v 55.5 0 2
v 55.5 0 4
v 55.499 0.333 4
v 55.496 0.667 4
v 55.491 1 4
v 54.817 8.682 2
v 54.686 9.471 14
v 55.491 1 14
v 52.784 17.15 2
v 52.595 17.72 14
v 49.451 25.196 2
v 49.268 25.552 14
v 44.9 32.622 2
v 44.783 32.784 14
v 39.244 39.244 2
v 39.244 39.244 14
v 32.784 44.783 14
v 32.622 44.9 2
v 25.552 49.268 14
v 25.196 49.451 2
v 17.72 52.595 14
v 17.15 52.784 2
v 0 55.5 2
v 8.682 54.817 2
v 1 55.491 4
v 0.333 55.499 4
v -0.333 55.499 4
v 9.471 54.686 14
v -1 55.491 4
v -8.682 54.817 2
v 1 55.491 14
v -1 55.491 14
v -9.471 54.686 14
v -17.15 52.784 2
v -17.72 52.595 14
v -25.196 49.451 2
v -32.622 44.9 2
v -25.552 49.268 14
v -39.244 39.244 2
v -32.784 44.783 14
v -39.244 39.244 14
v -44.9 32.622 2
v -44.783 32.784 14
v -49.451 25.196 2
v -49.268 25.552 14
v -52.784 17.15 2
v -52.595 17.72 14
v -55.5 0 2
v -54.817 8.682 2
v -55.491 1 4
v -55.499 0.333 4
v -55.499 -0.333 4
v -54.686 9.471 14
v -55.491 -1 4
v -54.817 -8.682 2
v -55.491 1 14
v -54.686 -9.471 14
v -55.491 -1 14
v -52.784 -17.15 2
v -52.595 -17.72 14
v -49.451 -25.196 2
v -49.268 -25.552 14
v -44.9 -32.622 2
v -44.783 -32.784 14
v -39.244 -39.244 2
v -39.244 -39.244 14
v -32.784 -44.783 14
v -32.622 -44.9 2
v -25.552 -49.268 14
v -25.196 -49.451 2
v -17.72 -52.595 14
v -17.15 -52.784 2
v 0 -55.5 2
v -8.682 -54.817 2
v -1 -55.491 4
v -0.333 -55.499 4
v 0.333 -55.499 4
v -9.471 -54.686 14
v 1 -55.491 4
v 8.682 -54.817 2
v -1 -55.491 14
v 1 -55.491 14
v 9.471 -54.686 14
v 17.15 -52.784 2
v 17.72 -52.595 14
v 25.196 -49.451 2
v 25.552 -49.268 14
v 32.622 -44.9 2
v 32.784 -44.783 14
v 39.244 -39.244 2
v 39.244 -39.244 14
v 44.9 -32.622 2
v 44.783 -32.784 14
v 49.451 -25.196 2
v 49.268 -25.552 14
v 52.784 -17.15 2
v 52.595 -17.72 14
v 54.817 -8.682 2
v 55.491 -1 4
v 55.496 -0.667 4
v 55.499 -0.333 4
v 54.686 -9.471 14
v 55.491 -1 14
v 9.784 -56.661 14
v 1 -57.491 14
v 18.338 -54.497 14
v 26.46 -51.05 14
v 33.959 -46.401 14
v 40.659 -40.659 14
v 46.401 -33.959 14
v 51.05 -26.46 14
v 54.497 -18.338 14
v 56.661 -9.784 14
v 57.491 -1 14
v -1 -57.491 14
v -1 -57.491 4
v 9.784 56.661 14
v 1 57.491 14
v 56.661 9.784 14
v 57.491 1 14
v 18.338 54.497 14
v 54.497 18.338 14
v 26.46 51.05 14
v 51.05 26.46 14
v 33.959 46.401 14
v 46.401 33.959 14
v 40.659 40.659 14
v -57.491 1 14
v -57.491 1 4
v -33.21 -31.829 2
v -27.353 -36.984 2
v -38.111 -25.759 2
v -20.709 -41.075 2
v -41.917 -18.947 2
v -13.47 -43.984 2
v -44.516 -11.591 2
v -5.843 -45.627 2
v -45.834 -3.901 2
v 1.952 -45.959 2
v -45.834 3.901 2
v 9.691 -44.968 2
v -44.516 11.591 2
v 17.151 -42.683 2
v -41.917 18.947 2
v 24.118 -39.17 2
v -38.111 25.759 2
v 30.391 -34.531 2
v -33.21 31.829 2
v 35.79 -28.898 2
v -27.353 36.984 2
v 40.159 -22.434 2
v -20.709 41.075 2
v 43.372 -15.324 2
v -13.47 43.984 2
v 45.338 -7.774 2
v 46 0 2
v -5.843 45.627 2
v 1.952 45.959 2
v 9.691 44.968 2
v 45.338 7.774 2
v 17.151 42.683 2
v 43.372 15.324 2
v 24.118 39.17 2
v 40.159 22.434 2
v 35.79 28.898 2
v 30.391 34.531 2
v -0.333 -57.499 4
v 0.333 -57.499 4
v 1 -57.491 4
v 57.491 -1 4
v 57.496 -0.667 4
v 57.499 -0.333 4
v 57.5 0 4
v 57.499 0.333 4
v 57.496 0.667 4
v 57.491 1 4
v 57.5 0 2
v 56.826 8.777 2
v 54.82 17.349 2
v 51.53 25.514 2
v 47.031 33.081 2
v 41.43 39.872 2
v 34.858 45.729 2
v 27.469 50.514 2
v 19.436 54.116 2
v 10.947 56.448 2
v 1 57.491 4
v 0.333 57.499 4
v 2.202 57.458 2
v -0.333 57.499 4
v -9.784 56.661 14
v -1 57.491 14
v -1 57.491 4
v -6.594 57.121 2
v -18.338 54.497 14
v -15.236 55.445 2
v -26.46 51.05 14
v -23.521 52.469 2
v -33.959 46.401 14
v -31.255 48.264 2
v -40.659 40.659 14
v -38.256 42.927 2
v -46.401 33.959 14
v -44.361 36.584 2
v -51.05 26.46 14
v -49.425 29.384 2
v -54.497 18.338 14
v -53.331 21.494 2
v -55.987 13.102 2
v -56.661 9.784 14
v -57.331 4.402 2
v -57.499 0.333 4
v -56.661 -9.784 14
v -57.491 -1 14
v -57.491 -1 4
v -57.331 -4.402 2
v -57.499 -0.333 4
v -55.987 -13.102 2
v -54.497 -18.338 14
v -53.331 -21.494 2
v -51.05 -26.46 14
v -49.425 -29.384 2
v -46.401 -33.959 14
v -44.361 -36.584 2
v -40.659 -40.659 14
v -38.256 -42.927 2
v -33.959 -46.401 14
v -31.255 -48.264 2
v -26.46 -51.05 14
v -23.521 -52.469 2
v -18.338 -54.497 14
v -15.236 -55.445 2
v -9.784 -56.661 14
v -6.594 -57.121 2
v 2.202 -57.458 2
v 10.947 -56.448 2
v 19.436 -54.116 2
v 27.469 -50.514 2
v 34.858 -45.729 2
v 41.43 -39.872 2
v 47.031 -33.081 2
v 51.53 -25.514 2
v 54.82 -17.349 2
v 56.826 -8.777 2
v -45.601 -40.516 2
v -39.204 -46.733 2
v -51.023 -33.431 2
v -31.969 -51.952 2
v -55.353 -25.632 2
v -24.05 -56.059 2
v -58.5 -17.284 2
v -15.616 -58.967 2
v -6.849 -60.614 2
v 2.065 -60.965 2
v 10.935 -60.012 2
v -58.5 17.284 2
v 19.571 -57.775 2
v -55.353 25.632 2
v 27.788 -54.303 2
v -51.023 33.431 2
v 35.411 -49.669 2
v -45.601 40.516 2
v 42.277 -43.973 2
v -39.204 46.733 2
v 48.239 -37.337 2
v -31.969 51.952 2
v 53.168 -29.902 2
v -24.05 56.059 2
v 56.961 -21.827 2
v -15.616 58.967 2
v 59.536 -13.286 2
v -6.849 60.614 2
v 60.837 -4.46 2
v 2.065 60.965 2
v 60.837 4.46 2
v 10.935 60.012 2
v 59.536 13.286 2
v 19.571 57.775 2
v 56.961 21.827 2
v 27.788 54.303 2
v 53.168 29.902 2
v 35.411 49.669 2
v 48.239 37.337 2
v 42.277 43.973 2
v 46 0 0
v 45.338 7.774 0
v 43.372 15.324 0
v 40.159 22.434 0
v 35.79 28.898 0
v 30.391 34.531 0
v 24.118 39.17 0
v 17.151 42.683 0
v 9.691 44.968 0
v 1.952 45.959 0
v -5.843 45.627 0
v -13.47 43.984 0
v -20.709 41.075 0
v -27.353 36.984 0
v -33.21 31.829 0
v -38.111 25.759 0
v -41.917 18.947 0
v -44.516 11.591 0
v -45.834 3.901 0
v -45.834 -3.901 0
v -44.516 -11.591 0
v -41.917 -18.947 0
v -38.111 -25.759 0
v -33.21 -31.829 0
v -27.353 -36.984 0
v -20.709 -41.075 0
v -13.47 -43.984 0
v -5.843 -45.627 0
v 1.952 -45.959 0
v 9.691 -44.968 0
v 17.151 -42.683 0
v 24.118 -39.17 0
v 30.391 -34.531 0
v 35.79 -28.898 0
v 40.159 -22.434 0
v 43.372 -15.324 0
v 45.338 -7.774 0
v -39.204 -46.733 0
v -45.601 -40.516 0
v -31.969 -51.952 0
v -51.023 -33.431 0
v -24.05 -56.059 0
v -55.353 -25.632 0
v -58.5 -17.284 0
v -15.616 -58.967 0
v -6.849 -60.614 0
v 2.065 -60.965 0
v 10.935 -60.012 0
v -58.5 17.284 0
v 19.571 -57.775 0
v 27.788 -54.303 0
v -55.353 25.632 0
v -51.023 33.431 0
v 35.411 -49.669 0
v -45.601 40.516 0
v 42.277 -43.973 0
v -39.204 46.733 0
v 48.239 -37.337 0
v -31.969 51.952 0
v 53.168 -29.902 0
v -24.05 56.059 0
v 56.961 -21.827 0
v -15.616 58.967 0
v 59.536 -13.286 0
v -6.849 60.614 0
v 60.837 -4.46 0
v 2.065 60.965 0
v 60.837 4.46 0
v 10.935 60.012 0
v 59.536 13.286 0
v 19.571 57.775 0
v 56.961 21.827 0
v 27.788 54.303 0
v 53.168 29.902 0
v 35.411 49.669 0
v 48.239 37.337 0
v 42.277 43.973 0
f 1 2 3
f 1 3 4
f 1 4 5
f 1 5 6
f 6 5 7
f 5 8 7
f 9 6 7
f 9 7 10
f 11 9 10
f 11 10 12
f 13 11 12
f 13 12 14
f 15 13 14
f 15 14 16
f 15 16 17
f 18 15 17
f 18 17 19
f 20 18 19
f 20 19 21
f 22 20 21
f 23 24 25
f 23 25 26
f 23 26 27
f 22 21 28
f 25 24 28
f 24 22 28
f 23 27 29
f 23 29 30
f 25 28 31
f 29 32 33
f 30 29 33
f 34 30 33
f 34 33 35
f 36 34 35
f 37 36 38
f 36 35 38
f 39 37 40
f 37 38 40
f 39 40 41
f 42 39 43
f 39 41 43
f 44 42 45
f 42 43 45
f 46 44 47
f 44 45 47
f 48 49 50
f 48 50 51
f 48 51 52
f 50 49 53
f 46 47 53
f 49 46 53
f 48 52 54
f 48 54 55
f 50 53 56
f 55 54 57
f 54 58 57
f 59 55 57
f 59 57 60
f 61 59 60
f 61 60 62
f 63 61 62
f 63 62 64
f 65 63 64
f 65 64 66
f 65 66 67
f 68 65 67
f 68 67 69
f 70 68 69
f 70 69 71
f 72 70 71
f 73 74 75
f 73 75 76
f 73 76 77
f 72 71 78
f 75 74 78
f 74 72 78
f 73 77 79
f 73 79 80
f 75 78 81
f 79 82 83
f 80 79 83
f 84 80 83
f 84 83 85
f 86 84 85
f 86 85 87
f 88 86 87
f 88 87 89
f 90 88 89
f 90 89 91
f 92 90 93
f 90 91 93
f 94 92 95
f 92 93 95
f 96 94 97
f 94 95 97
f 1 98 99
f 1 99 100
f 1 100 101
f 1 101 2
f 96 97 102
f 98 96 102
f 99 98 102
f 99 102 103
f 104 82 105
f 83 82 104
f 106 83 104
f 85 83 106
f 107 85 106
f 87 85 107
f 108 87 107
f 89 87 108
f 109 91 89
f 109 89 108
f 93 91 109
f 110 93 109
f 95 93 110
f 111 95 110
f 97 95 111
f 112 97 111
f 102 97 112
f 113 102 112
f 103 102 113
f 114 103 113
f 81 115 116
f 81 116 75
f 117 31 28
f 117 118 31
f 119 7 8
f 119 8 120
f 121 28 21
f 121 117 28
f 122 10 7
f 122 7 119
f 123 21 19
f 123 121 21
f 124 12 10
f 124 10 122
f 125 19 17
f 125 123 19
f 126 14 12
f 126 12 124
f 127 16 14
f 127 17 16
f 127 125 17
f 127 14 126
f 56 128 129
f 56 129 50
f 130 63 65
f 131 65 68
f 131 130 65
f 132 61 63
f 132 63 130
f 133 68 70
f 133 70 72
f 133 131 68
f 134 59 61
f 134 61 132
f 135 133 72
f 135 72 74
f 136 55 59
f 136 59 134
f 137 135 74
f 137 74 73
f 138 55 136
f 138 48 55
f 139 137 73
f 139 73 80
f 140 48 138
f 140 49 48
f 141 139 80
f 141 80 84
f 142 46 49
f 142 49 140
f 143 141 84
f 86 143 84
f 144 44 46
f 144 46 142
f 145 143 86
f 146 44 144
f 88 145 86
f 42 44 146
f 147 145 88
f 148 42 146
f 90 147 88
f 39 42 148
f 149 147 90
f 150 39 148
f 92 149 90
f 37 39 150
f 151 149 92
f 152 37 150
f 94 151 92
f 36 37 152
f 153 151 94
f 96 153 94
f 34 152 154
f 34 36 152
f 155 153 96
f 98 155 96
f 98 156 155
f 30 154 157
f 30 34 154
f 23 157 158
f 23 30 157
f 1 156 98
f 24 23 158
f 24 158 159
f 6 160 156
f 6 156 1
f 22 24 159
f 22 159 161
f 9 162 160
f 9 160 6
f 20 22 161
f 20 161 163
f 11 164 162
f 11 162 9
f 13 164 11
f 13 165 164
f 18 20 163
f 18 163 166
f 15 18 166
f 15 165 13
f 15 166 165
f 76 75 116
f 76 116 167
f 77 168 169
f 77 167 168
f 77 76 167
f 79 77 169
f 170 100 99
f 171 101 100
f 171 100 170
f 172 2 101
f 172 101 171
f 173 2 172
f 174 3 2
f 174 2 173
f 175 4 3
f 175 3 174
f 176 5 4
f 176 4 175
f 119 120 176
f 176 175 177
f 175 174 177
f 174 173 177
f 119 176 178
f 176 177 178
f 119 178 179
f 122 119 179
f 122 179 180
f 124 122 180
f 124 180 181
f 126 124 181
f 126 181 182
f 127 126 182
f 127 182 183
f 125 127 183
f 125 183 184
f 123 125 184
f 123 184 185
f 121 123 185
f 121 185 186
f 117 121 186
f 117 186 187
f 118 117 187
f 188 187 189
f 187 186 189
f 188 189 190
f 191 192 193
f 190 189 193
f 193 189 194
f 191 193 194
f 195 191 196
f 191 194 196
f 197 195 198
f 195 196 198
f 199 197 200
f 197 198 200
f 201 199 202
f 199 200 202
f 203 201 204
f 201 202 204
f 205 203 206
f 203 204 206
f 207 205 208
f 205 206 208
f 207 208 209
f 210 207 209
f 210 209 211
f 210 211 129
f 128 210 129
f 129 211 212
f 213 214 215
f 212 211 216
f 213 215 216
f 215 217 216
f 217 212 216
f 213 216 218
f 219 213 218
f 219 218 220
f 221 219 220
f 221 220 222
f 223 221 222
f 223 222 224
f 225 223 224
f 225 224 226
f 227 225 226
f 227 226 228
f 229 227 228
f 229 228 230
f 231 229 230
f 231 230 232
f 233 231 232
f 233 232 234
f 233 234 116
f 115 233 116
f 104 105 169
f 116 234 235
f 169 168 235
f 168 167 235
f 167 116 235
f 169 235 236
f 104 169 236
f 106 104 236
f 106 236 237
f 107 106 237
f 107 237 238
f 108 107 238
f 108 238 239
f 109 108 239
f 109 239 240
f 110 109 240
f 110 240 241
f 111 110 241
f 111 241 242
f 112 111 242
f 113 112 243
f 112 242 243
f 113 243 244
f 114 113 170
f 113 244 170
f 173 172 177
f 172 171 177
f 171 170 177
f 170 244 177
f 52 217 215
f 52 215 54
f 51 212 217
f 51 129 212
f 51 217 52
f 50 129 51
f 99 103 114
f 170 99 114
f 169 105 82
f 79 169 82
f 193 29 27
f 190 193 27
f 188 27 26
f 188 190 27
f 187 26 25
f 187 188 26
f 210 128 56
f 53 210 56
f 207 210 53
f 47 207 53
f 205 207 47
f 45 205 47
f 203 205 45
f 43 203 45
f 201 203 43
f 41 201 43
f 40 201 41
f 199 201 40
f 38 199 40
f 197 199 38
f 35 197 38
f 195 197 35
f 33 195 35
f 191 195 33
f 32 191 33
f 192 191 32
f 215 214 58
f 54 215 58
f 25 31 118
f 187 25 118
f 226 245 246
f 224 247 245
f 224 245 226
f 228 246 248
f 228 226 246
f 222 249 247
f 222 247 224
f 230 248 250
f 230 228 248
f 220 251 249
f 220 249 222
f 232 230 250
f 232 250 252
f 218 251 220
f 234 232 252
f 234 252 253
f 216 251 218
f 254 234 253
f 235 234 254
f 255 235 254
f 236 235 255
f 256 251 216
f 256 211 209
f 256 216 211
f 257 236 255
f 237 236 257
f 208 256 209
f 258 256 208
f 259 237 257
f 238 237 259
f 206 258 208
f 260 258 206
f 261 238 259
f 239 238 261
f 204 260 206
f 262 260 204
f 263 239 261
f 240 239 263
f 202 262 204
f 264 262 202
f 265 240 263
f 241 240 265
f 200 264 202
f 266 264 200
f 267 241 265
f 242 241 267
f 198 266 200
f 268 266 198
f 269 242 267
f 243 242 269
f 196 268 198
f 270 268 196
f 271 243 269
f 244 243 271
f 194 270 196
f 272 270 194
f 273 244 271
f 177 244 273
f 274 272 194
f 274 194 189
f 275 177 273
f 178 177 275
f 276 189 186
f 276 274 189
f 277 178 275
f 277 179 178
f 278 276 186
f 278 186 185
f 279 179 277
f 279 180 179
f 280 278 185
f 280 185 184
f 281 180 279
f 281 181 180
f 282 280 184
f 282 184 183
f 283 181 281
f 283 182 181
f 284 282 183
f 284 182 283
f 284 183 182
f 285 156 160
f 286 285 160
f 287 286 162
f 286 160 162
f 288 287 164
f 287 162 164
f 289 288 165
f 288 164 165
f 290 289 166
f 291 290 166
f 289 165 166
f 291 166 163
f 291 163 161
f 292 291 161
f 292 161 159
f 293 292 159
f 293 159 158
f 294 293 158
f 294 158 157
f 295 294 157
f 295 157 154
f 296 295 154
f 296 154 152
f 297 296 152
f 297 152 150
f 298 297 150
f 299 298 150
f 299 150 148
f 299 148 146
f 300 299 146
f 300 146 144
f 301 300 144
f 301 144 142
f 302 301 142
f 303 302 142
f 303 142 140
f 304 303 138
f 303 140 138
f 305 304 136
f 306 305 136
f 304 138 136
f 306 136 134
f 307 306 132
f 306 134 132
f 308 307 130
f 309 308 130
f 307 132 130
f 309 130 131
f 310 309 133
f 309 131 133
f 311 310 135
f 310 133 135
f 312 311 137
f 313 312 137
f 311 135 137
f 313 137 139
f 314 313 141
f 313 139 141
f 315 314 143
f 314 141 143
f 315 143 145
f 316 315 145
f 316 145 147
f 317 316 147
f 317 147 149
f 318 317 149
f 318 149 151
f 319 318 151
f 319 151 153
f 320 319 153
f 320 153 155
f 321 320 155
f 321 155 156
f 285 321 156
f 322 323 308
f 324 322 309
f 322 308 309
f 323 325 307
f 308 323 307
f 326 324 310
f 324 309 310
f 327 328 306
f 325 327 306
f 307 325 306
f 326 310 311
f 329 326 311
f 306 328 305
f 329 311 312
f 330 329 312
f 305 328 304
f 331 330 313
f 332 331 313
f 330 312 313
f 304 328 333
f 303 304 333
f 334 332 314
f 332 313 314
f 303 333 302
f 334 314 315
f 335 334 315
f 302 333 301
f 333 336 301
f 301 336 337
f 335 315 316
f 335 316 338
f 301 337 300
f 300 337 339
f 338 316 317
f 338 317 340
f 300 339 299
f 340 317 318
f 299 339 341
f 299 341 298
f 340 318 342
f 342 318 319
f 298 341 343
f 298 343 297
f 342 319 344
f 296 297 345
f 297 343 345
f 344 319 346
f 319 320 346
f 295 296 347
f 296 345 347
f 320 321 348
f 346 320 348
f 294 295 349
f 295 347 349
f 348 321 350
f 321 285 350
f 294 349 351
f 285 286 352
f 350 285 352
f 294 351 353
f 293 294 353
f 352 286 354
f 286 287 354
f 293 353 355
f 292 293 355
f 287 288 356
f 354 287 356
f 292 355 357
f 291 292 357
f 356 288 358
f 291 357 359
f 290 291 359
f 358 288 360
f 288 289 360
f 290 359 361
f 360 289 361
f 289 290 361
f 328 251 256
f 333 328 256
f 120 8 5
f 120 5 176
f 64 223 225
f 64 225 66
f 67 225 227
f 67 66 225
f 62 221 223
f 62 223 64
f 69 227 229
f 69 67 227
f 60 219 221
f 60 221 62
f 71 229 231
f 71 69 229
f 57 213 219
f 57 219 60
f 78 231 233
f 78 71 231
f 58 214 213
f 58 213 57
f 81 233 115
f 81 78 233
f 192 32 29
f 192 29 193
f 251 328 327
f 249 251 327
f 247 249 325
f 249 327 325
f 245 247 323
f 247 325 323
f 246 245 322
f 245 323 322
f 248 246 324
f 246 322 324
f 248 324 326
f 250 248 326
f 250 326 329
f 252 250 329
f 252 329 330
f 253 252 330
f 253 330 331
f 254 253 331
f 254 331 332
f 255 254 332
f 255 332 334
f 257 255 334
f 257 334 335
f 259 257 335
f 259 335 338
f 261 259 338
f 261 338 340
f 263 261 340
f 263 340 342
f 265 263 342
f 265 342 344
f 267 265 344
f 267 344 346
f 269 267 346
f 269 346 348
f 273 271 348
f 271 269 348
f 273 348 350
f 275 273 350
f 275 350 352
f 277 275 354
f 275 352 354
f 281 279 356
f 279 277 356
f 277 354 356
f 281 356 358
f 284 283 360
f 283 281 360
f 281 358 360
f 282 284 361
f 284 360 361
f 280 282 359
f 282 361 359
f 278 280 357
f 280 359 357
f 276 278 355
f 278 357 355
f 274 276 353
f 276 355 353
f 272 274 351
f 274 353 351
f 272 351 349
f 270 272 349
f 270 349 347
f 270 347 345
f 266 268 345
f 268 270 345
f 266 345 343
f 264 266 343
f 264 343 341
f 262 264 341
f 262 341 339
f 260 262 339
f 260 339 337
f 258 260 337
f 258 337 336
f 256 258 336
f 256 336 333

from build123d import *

# Parameters (mm, degrees)
F0_R      = 61
F1_DEPTH  = 2
F2_R      = 57.5
F3_DEPTH  = 12
F4_R      = 46
F5_DEPTH  = 112.4
F6_R      = 55.5
F6_R_2    = 46
F7_DEPTH  = 12
F9_DEPTH  = 25
F10_W     = 130.4447948933
F10_H     = 2
F11_DEPTH = 10
F12_W     = 2
F12_H     = 119
F13_DEPTH = 10


with BuildPart() as f1:
    # F0 (on Top) → F1 (new body)
    with BuildSketch(Plane.XY):
        Circle(F0_R)
    extrude(amount=F1_DEPTH)

    # F2 (on face) → F3 (join)
    with BuildSketch(Plane.XY.offset(2)):
        Circle(F2_R)
    extrude(amount=F3_DEPTH)

    # F4 (on face) → F5 (cut)
    with BuildSketch(Plane.XY.offset(14)):
        Circle(F4_R)
    extrude(amount=-F5_DEPTH, mode=Mode.SUBTRACT)

    # F6 (on face) → F7 (cut)
    with BuildSketch(Plane.XY.offset(14)):
        Circle(F6_R)
        Circle(F6_R_2, mode=Mode.SUBTRACT)
    extrude(amount=-F7_DEPTH, mode=Mode.SUBTRACT)

    # F8 (on face) → F9 (cut)
    with BuildSketch(Plane.XY.offset(2)):
        with BuildLine():
            Line((-58.5, -17.2843860174), (-58.5, 17.2843860174))
            ThreePointArc((-58.5, 17.2843860174), (-61, 0), (-58.5, -17.2843860174))
        make_face()
    extrude(amount=-F9_DEPTH, mode=Mode.SUBTRACT)

    # F10 (on face) → F11 (cut)
    with BuildSketch(Plane.XY.offset(14)):
        Rectangle(F10_W, F10_H)
    extrude(amount=-F11_DEPTH, mode=Mode.SUBTRACT)

    # F12 (on face) → F13 (cut)
    with BuildSketch(Plane.XY.offset(14)):
        Rectangle(F12_W, F12_H)
    extrude(amount=-F13_DEPTH, mode=Mode.SUBTRACT)


solid = f1.part
